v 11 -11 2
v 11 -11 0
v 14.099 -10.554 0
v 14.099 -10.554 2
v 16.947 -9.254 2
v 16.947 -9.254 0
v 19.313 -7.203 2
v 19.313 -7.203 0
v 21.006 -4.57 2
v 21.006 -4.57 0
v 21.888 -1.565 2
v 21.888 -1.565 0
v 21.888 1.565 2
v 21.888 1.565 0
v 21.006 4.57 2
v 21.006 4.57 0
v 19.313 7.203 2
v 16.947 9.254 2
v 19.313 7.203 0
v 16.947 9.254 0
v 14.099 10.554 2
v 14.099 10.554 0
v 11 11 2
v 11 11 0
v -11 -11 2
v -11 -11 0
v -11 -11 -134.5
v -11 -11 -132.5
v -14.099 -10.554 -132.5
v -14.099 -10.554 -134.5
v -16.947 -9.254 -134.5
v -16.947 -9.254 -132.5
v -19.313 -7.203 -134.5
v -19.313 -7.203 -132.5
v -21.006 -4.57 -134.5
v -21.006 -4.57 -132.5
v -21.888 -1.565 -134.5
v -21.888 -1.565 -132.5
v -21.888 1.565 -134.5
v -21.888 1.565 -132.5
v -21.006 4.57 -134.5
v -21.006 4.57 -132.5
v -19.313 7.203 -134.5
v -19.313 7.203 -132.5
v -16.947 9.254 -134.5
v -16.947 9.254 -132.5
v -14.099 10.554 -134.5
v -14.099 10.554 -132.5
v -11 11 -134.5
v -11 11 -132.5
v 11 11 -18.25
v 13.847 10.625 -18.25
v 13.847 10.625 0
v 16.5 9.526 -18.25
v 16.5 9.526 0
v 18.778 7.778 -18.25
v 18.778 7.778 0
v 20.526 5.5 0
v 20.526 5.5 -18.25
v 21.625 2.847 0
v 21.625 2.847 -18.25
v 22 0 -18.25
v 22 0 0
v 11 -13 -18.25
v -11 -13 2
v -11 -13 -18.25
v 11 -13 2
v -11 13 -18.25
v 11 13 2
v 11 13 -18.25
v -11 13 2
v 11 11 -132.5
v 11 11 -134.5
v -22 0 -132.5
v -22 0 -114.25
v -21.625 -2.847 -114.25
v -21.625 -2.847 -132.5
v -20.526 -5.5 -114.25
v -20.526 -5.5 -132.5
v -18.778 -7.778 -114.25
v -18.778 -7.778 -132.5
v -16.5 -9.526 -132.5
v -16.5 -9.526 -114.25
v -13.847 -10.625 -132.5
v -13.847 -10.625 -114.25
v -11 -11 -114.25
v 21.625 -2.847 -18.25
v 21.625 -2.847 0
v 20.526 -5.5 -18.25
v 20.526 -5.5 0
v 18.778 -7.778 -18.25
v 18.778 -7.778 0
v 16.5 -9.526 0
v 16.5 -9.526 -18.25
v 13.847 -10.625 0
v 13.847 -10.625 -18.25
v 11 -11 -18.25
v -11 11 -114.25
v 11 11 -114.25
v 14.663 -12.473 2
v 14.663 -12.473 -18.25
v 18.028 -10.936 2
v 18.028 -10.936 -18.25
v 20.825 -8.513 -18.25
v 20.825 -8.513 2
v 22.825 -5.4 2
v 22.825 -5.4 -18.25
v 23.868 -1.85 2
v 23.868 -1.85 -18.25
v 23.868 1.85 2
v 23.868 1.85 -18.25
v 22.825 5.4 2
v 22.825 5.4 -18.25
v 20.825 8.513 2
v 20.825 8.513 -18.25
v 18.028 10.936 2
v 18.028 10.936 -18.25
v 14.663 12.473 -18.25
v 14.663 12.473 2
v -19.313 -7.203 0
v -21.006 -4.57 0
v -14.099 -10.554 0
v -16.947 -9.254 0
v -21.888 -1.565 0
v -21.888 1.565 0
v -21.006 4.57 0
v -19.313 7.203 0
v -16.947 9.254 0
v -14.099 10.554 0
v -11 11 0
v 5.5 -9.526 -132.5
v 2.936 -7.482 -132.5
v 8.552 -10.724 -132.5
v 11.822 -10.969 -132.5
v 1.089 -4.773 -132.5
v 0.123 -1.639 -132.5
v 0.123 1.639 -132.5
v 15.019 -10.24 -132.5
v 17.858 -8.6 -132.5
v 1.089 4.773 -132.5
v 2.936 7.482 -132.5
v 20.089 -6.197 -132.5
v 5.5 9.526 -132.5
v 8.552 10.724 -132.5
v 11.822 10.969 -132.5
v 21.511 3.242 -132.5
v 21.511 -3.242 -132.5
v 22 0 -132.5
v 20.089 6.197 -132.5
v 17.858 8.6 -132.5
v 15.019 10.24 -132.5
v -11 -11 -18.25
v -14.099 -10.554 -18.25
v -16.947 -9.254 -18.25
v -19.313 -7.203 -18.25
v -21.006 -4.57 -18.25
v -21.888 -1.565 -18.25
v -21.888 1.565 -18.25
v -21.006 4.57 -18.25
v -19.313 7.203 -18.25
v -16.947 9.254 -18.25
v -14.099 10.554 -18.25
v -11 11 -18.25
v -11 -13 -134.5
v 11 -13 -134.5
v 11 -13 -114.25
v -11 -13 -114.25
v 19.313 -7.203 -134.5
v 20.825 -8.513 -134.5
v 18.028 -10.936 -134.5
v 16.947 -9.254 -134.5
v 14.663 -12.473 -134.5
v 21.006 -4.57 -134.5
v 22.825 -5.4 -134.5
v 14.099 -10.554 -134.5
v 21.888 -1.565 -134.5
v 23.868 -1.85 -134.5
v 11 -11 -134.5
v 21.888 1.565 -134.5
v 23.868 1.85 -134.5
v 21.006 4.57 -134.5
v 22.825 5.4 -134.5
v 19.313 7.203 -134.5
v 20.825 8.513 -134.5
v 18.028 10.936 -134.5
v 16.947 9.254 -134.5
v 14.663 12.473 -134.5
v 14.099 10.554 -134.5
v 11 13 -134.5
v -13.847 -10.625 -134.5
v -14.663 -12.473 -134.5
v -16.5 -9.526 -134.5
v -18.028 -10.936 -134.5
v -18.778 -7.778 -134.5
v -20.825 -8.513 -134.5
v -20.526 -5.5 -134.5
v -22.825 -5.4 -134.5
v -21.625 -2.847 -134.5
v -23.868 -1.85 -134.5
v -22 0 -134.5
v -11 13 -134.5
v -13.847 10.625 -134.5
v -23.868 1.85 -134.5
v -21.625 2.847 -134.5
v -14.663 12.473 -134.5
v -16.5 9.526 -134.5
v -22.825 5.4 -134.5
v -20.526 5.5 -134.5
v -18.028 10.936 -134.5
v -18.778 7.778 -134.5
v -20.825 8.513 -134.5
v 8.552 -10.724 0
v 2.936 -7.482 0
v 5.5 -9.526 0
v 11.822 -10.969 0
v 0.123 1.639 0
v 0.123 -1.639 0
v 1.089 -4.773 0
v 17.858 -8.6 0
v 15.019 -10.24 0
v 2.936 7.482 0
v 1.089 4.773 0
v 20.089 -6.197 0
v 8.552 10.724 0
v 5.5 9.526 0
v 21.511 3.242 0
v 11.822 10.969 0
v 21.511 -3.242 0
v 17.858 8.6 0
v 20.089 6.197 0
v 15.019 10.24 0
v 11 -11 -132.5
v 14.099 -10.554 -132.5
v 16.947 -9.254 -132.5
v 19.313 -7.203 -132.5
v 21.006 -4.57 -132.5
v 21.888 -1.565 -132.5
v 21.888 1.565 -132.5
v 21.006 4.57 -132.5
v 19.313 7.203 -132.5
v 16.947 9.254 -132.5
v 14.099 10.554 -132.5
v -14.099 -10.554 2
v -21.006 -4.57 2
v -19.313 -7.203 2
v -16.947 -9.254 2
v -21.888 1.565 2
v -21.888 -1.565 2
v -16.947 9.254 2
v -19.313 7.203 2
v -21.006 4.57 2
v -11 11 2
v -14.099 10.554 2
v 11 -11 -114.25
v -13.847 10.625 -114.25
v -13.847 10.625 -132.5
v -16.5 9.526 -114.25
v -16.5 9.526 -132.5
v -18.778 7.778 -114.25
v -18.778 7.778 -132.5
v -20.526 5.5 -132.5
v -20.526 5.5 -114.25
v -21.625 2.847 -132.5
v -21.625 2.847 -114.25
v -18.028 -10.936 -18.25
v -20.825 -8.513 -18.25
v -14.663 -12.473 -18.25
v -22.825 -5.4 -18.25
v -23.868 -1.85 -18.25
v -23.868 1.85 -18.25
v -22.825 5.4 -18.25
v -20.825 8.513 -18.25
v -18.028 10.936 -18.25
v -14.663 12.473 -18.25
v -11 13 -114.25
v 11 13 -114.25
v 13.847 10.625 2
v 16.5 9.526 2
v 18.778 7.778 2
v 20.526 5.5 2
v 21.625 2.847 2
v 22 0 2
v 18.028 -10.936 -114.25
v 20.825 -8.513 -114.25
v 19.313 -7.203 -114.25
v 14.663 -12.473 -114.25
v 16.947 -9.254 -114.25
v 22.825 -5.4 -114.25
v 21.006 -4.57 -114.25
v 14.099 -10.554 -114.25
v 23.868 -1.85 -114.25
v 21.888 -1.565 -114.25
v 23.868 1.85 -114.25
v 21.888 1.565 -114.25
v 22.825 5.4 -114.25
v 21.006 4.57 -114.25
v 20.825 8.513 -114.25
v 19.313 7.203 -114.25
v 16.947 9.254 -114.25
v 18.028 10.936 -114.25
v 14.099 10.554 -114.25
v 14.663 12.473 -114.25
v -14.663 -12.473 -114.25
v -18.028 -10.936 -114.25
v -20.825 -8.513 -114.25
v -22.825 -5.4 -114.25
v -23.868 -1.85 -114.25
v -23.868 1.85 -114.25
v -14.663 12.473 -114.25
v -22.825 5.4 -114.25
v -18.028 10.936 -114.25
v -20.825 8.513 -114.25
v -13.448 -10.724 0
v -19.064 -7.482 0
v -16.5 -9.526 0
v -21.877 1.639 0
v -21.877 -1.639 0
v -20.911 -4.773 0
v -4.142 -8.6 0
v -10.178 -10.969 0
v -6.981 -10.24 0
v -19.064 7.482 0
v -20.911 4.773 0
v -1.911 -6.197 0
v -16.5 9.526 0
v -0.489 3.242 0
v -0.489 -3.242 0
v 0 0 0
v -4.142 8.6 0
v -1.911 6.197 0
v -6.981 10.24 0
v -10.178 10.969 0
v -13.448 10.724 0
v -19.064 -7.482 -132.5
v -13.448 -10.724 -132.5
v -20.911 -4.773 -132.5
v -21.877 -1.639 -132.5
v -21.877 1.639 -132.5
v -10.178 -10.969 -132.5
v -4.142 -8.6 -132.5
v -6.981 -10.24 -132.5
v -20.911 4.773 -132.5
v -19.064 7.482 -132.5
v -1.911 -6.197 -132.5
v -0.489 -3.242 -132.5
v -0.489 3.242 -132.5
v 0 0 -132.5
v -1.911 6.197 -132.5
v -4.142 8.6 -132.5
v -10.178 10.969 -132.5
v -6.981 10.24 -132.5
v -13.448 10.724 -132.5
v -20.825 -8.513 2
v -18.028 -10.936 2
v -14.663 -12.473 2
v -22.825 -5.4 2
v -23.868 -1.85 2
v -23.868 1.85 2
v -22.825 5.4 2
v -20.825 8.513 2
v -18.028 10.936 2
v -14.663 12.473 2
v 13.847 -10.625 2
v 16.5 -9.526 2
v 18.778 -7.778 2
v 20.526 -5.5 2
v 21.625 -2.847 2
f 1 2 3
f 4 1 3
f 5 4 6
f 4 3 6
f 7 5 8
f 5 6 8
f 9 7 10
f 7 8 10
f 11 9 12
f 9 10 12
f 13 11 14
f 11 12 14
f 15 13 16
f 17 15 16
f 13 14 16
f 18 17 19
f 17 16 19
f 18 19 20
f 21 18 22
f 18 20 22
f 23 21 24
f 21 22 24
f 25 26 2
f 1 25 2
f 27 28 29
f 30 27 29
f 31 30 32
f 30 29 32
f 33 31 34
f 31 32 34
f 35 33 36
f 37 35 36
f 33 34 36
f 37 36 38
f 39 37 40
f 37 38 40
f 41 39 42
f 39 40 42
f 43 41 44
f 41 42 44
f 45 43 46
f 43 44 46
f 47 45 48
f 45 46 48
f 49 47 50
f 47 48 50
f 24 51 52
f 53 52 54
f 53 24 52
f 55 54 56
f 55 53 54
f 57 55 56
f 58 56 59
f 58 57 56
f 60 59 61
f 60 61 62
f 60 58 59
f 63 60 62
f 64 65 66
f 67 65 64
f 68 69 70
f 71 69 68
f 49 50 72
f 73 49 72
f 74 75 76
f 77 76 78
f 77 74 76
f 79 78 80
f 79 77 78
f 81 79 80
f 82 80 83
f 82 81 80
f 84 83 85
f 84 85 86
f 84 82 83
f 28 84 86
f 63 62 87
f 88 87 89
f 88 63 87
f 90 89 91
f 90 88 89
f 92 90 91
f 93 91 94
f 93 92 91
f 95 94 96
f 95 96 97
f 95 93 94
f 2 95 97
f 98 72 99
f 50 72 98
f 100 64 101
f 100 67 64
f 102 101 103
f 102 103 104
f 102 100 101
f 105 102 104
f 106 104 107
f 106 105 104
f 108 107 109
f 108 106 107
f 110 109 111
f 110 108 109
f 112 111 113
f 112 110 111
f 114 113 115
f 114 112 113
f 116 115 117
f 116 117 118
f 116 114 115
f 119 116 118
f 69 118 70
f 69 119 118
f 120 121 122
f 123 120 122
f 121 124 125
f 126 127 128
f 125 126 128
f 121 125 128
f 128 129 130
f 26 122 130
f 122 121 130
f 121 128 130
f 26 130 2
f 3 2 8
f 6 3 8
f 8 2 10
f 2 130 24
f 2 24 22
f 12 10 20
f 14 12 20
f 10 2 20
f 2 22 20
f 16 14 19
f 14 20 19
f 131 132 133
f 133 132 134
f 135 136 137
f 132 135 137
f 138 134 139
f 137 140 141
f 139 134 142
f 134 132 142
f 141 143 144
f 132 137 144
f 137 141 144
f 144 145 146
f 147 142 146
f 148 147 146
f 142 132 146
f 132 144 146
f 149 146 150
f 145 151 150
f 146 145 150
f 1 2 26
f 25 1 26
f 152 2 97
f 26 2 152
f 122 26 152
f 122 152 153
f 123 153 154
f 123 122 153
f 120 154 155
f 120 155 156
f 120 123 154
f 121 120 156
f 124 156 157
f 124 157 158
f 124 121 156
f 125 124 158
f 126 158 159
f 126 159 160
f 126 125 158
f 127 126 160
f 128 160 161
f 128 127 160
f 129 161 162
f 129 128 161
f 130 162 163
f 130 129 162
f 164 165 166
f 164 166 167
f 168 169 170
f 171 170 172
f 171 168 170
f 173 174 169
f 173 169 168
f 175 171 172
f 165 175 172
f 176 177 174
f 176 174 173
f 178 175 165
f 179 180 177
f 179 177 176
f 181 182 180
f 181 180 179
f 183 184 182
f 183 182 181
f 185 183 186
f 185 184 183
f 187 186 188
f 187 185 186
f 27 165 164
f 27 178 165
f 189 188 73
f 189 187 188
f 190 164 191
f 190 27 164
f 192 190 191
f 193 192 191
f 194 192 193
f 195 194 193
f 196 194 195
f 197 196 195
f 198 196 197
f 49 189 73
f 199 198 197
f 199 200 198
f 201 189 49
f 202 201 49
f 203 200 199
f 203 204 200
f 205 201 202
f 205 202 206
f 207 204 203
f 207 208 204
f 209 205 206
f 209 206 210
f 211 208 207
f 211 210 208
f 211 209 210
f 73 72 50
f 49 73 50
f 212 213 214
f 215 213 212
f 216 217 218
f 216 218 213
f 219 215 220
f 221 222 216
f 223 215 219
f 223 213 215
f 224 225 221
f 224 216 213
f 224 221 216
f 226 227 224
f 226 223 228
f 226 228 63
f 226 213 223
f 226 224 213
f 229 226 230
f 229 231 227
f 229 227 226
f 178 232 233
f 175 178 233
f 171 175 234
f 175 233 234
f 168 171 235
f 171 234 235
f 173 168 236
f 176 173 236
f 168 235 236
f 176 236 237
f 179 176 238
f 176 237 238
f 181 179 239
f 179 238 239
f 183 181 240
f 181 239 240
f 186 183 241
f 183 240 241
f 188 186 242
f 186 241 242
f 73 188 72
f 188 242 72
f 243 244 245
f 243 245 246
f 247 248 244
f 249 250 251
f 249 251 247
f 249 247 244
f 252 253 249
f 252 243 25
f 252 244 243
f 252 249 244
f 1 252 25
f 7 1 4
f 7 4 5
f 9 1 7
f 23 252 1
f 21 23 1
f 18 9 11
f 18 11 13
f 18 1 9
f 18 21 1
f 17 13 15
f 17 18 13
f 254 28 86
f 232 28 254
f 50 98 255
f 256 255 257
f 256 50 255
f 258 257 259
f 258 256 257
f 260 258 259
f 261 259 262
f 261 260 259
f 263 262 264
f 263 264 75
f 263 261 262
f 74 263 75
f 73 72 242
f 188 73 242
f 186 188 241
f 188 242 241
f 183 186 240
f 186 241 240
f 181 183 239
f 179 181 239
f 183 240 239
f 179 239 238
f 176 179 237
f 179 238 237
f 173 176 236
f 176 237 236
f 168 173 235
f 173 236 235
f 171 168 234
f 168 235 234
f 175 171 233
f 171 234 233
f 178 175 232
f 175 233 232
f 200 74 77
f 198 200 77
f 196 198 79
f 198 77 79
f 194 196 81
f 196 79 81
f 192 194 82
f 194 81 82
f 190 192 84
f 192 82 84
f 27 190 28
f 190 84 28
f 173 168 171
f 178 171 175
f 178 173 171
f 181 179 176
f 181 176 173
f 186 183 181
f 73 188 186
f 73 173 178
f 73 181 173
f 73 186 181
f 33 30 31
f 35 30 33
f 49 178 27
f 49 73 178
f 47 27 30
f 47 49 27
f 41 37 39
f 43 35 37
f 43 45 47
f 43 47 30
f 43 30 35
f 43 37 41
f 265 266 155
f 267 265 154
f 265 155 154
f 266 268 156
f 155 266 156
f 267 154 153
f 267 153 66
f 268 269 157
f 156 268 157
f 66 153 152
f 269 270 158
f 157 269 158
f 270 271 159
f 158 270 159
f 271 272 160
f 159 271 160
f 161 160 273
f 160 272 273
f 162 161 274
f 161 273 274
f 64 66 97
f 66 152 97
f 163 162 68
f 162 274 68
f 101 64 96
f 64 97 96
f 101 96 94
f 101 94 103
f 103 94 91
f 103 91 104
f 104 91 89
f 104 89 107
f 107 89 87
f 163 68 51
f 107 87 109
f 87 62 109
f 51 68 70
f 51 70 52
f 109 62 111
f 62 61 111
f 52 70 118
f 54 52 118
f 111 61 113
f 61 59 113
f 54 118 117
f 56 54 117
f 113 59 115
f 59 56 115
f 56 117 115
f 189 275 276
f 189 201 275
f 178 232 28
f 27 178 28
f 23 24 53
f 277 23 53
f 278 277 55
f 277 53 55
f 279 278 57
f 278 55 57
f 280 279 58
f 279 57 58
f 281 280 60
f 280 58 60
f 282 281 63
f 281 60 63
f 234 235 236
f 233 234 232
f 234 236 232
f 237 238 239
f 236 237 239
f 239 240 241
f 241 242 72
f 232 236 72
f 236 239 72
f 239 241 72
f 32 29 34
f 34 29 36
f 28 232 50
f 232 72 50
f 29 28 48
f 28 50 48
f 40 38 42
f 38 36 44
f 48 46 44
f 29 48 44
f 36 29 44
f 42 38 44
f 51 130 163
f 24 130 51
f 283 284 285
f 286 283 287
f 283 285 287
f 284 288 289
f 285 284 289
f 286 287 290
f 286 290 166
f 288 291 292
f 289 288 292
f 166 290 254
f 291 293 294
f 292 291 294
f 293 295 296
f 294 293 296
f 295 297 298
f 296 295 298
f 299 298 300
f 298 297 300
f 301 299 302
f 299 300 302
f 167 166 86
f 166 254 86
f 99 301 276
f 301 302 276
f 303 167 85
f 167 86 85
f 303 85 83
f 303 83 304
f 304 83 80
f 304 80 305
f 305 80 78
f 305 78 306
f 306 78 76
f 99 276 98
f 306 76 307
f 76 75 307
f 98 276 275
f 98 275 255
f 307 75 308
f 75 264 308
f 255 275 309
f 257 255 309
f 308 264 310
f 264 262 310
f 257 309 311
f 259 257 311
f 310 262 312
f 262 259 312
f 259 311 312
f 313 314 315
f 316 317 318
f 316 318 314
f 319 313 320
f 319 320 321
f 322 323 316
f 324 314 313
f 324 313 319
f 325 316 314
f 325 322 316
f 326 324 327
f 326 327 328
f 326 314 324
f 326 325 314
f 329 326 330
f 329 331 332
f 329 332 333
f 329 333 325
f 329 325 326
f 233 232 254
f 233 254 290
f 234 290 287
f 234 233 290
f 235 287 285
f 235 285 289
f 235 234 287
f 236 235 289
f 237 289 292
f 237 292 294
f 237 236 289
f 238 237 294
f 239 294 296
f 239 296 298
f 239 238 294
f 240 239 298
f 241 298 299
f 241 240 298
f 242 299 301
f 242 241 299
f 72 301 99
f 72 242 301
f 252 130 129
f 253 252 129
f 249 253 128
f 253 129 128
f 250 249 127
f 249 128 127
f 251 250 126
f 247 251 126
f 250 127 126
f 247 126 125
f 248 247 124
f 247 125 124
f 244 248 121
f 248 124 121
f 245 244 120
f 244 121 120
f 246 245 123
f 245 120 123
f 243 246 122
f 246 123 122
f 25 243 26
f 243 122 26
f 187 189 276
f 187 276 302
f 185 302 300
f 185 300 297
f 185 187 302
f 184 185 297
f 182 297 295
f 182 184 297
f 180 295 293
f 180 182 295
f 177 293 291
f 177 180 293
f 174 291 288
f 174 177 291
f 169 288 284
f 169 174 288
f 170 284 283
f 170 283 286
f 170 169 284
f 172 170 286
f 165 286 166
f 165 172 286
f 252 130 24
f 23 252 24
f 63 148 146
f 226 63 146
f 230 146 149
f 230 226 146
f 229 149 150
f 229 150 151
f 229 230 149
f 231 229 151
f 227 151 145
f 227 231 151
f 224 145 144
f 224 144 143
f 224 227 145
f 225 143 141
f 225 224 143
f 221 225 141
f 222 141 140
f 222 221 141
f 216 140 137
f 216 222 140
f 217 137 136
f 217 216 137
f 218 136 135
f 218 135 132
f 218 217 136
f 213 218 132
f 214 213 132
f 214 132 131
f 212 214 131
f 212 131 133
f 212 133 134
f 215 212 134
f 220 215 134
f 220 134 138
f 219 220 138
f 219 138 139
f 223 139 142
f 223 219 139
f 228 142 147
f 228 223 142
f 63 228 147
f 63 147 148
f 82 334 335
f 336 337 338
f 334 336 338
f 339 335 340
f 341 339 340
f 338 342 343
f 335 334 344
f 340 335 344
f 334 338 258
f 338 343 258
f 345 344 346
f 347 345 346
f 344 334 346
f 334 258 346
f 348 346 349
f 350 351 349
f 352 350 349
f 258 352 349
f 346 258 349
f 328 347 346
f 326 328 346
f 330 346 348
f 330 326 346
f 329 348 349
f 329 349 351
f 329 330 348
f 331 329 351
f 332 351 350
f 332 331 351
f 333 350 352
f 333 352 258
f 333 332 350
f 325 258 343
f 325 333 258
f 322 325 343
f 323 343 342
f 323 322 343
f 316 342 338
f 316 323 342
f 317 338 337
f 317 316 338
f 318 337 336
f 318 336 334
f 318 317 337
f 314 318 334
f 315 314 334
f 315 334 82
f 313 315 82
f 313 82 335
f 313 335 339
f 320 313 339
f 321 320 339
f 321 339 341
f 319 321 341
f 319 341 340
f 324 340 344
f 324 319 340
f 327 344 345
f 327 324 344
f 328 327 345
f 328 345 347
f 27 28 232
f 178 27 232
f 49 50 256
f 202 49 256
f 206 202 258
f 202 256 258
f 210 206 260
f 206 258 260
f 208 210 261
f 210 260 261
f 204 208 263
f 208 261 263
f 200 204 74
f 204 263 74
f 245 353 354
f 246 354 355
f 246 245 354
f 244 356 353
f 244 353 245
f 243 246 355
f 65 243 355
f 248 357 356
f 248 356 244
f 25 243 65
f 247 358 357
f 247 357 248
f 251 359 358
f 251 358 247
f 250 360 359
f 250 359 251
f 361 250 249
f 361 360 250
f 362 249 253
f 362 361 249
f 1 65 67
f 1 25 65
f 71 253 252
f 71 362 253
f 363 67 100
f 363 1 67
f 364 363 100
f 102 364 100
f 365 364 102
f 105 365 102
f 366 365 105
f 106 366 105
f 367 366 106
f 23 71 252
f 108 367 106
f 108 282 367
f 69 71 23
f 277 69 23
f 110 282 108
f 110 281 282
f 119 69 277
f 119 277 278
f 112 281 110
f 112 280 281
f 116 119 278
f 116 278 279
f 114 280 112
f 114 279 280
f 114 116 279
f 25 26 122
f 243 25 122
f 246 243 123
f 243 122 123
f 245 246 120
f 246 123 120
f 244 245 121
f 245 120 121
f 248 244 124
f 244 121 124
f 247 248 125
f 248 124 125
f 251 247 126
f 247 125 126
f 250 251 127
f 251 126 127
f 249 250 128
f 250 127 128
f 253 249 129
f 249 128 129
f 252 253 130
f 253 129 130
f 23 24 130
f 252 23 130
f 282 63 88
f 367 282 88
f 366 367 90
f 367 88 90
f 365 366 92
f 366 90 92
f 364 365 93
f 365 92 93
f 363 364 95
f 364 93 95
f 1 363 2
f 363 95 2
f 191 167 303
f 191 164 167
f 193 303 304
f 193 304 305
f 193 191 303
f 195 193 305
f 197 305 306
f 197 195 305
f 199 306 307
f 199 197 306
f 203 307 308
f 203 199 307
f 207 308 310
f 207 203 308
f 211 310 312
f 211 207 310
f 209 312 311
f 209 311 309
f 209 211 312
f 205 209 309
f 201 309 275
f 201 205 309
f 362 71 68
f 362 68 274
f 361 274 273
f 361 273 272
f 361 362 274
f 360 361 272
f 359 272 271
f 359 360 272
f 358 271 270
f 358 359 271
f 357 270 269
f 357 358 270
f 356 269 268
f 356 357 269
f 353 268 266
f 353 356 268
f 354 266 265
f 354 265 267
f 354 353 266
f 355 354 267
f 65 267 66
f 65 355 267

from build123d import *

# Parameters (mm, degrees)
ESQUISSE1_R              = 11
BOSS_EXTRU_2_DEPTH       = 132.5
BOSS_EXTRU_2_2_DEPTH     = 132.5
BOSS_EXTRU_8_DEPTH       = 2
BOSS_EXTRU_8_DEPTH_BACK  = 18.25
BOSS_EXTRU_29_DEPTH      = 2
BOSS_EXTRU_33_DEPTH      = 2
BOSS_EXTRU_33_DEPTH_BACK = 18.25
BOSS_EXTRU_34_DEPTH      = 2


with BuildPart() as part:
    # Esquisse1 → Boss.-Extru.2 (new body)
    with BuildSketch(Plane.XY):
        with Locations((-11, 0)):
            Circle(ESQUISSE1_R)
    extrude(amount=-BOSS_EXTRU_2_DEPTH)


with BuildPart() as body_2:
    # Esquisse1 → Boss.-Extru.2 2 (new body)
    with BuildSketch(Plane.XY):
        with Locations((11, 0)):
            Circle(ESQUISSE1_R)
    extrude(amount=-BOSS_EXTRU_2_2_DEPTH)


with BuildPart() as body_3:
    # Esquisse1<5> → Boss.-Extru.8 (new, two sides: drawn at the far end of the back side and taken through both)
    with BuildSketch(Plane.XY.offset(-BOSS_EXTRU_8_DEPTH_BACK)):
        with BuildLine():
            Line((11, 13), (-11, 13))
            ThreePointArc((-11, 13), (-24, 0), (-11, -13))
            Line((-11, -13), (11, -13))
            ThreePointArc((11, -13), (24, 0), (11, 13))
        make_face()
        with BuildLine():
            Line((11, -11), (-11, -11))
            ThreePointArc((-11, -11), (-22, 0), (-11, 11))
            Line((-11, 11), (11, 11))
            ThreePointArc((11, 11), (18.778174593, 7.778174593), (22, 0))
            ThreePointArc((22, 0), (18.778174593, -7.778174593), (11, -11))
        make_face(mode=Mode.SUBTRACT)
    extrude(amount=BOSS_EXTRU_8_DEPTH + BOSS_EXTRU_8_DEPTH_BACK)


with BuildPart() as body_4:
    # Esquisse1<6> → Boss.-Extru.29 (new body)
    with BuildSketch(Plane.XY):
        with BuildLine():
            Line((-11, -11), (11, -11))
            ThreePointArc((11, -11), (22, 0), (11, 11))
            Line((11, 11), (-11, 11))
            ThreePointArc((-11, 11), (-22, 0), (-11, -11))
        make_face()
    extrude(amount=BOSS_EXTRU_29_DEPTH)


with BuildPart() as body_5:
    # Esquisse8 → Boss.-Extru.33 (new, two sides: drawn at the far end of the back side and taken through both)
    with BuildSketch(Plane(origin=(0, 0, -132.5), x_dir=(-1, 0, 0), z_dir=(0, 0, -1)).offset(-BOSS_EXTRU_33_DEPTH_BACK)):
        with BuildLine():
            Line((11, 13), (-11, 13))
            ThreePointArc((-11, 13), (-24, 0), (-11, -13))
            Line((-11, -13), (11, -13))
            ThreePointArc((11, -13), (24, 0), (11, 13))
        make_face()
        with BuildLine():
            Line((11, -11), (-11, -11))
            ThreePointArc((-11, -11), (-22, 0), (-11, 11))
            Line((-11, 11), (11, 11))
            ThreePointArc((11, 11), (18.778174593, 7.778174593), (22, 0))
            ThreePointArc((22, 0), (18.778174593, -7.778174593), (11, -11))
        make_face(mode=Mode.SUBTRACT)
    extrude(amount=BOSS_EXTRU_33_DEPTH + BOSS_EXTRU_33_DEPTH_BACK)


with BuildPart() as body_6:
    # Esquisse8<3> → Boss.-Extru.34 (new body)
    with BuildSketch(Plane(origin=(0, 0, -132.5), x_dir=(-1, 0, 0), z_dir=(0, 0, -1))):
        with BuildLine():
            Line((-11, -11), (11, -11))
            ThreePointArc((11, -11), (22, 0), (11, 11))
            Line((11, 11), (-11, 11))
            ThreePointArc((-11, 11), (-22, 0), (-11, -11))
        make_face()
    extrude(amount=BOSS_EXTRU_34_DEPTH)


solid = Compound([part.part, body_2.part, body_3.part, body_4.part, body_5.part, body_6.part])
